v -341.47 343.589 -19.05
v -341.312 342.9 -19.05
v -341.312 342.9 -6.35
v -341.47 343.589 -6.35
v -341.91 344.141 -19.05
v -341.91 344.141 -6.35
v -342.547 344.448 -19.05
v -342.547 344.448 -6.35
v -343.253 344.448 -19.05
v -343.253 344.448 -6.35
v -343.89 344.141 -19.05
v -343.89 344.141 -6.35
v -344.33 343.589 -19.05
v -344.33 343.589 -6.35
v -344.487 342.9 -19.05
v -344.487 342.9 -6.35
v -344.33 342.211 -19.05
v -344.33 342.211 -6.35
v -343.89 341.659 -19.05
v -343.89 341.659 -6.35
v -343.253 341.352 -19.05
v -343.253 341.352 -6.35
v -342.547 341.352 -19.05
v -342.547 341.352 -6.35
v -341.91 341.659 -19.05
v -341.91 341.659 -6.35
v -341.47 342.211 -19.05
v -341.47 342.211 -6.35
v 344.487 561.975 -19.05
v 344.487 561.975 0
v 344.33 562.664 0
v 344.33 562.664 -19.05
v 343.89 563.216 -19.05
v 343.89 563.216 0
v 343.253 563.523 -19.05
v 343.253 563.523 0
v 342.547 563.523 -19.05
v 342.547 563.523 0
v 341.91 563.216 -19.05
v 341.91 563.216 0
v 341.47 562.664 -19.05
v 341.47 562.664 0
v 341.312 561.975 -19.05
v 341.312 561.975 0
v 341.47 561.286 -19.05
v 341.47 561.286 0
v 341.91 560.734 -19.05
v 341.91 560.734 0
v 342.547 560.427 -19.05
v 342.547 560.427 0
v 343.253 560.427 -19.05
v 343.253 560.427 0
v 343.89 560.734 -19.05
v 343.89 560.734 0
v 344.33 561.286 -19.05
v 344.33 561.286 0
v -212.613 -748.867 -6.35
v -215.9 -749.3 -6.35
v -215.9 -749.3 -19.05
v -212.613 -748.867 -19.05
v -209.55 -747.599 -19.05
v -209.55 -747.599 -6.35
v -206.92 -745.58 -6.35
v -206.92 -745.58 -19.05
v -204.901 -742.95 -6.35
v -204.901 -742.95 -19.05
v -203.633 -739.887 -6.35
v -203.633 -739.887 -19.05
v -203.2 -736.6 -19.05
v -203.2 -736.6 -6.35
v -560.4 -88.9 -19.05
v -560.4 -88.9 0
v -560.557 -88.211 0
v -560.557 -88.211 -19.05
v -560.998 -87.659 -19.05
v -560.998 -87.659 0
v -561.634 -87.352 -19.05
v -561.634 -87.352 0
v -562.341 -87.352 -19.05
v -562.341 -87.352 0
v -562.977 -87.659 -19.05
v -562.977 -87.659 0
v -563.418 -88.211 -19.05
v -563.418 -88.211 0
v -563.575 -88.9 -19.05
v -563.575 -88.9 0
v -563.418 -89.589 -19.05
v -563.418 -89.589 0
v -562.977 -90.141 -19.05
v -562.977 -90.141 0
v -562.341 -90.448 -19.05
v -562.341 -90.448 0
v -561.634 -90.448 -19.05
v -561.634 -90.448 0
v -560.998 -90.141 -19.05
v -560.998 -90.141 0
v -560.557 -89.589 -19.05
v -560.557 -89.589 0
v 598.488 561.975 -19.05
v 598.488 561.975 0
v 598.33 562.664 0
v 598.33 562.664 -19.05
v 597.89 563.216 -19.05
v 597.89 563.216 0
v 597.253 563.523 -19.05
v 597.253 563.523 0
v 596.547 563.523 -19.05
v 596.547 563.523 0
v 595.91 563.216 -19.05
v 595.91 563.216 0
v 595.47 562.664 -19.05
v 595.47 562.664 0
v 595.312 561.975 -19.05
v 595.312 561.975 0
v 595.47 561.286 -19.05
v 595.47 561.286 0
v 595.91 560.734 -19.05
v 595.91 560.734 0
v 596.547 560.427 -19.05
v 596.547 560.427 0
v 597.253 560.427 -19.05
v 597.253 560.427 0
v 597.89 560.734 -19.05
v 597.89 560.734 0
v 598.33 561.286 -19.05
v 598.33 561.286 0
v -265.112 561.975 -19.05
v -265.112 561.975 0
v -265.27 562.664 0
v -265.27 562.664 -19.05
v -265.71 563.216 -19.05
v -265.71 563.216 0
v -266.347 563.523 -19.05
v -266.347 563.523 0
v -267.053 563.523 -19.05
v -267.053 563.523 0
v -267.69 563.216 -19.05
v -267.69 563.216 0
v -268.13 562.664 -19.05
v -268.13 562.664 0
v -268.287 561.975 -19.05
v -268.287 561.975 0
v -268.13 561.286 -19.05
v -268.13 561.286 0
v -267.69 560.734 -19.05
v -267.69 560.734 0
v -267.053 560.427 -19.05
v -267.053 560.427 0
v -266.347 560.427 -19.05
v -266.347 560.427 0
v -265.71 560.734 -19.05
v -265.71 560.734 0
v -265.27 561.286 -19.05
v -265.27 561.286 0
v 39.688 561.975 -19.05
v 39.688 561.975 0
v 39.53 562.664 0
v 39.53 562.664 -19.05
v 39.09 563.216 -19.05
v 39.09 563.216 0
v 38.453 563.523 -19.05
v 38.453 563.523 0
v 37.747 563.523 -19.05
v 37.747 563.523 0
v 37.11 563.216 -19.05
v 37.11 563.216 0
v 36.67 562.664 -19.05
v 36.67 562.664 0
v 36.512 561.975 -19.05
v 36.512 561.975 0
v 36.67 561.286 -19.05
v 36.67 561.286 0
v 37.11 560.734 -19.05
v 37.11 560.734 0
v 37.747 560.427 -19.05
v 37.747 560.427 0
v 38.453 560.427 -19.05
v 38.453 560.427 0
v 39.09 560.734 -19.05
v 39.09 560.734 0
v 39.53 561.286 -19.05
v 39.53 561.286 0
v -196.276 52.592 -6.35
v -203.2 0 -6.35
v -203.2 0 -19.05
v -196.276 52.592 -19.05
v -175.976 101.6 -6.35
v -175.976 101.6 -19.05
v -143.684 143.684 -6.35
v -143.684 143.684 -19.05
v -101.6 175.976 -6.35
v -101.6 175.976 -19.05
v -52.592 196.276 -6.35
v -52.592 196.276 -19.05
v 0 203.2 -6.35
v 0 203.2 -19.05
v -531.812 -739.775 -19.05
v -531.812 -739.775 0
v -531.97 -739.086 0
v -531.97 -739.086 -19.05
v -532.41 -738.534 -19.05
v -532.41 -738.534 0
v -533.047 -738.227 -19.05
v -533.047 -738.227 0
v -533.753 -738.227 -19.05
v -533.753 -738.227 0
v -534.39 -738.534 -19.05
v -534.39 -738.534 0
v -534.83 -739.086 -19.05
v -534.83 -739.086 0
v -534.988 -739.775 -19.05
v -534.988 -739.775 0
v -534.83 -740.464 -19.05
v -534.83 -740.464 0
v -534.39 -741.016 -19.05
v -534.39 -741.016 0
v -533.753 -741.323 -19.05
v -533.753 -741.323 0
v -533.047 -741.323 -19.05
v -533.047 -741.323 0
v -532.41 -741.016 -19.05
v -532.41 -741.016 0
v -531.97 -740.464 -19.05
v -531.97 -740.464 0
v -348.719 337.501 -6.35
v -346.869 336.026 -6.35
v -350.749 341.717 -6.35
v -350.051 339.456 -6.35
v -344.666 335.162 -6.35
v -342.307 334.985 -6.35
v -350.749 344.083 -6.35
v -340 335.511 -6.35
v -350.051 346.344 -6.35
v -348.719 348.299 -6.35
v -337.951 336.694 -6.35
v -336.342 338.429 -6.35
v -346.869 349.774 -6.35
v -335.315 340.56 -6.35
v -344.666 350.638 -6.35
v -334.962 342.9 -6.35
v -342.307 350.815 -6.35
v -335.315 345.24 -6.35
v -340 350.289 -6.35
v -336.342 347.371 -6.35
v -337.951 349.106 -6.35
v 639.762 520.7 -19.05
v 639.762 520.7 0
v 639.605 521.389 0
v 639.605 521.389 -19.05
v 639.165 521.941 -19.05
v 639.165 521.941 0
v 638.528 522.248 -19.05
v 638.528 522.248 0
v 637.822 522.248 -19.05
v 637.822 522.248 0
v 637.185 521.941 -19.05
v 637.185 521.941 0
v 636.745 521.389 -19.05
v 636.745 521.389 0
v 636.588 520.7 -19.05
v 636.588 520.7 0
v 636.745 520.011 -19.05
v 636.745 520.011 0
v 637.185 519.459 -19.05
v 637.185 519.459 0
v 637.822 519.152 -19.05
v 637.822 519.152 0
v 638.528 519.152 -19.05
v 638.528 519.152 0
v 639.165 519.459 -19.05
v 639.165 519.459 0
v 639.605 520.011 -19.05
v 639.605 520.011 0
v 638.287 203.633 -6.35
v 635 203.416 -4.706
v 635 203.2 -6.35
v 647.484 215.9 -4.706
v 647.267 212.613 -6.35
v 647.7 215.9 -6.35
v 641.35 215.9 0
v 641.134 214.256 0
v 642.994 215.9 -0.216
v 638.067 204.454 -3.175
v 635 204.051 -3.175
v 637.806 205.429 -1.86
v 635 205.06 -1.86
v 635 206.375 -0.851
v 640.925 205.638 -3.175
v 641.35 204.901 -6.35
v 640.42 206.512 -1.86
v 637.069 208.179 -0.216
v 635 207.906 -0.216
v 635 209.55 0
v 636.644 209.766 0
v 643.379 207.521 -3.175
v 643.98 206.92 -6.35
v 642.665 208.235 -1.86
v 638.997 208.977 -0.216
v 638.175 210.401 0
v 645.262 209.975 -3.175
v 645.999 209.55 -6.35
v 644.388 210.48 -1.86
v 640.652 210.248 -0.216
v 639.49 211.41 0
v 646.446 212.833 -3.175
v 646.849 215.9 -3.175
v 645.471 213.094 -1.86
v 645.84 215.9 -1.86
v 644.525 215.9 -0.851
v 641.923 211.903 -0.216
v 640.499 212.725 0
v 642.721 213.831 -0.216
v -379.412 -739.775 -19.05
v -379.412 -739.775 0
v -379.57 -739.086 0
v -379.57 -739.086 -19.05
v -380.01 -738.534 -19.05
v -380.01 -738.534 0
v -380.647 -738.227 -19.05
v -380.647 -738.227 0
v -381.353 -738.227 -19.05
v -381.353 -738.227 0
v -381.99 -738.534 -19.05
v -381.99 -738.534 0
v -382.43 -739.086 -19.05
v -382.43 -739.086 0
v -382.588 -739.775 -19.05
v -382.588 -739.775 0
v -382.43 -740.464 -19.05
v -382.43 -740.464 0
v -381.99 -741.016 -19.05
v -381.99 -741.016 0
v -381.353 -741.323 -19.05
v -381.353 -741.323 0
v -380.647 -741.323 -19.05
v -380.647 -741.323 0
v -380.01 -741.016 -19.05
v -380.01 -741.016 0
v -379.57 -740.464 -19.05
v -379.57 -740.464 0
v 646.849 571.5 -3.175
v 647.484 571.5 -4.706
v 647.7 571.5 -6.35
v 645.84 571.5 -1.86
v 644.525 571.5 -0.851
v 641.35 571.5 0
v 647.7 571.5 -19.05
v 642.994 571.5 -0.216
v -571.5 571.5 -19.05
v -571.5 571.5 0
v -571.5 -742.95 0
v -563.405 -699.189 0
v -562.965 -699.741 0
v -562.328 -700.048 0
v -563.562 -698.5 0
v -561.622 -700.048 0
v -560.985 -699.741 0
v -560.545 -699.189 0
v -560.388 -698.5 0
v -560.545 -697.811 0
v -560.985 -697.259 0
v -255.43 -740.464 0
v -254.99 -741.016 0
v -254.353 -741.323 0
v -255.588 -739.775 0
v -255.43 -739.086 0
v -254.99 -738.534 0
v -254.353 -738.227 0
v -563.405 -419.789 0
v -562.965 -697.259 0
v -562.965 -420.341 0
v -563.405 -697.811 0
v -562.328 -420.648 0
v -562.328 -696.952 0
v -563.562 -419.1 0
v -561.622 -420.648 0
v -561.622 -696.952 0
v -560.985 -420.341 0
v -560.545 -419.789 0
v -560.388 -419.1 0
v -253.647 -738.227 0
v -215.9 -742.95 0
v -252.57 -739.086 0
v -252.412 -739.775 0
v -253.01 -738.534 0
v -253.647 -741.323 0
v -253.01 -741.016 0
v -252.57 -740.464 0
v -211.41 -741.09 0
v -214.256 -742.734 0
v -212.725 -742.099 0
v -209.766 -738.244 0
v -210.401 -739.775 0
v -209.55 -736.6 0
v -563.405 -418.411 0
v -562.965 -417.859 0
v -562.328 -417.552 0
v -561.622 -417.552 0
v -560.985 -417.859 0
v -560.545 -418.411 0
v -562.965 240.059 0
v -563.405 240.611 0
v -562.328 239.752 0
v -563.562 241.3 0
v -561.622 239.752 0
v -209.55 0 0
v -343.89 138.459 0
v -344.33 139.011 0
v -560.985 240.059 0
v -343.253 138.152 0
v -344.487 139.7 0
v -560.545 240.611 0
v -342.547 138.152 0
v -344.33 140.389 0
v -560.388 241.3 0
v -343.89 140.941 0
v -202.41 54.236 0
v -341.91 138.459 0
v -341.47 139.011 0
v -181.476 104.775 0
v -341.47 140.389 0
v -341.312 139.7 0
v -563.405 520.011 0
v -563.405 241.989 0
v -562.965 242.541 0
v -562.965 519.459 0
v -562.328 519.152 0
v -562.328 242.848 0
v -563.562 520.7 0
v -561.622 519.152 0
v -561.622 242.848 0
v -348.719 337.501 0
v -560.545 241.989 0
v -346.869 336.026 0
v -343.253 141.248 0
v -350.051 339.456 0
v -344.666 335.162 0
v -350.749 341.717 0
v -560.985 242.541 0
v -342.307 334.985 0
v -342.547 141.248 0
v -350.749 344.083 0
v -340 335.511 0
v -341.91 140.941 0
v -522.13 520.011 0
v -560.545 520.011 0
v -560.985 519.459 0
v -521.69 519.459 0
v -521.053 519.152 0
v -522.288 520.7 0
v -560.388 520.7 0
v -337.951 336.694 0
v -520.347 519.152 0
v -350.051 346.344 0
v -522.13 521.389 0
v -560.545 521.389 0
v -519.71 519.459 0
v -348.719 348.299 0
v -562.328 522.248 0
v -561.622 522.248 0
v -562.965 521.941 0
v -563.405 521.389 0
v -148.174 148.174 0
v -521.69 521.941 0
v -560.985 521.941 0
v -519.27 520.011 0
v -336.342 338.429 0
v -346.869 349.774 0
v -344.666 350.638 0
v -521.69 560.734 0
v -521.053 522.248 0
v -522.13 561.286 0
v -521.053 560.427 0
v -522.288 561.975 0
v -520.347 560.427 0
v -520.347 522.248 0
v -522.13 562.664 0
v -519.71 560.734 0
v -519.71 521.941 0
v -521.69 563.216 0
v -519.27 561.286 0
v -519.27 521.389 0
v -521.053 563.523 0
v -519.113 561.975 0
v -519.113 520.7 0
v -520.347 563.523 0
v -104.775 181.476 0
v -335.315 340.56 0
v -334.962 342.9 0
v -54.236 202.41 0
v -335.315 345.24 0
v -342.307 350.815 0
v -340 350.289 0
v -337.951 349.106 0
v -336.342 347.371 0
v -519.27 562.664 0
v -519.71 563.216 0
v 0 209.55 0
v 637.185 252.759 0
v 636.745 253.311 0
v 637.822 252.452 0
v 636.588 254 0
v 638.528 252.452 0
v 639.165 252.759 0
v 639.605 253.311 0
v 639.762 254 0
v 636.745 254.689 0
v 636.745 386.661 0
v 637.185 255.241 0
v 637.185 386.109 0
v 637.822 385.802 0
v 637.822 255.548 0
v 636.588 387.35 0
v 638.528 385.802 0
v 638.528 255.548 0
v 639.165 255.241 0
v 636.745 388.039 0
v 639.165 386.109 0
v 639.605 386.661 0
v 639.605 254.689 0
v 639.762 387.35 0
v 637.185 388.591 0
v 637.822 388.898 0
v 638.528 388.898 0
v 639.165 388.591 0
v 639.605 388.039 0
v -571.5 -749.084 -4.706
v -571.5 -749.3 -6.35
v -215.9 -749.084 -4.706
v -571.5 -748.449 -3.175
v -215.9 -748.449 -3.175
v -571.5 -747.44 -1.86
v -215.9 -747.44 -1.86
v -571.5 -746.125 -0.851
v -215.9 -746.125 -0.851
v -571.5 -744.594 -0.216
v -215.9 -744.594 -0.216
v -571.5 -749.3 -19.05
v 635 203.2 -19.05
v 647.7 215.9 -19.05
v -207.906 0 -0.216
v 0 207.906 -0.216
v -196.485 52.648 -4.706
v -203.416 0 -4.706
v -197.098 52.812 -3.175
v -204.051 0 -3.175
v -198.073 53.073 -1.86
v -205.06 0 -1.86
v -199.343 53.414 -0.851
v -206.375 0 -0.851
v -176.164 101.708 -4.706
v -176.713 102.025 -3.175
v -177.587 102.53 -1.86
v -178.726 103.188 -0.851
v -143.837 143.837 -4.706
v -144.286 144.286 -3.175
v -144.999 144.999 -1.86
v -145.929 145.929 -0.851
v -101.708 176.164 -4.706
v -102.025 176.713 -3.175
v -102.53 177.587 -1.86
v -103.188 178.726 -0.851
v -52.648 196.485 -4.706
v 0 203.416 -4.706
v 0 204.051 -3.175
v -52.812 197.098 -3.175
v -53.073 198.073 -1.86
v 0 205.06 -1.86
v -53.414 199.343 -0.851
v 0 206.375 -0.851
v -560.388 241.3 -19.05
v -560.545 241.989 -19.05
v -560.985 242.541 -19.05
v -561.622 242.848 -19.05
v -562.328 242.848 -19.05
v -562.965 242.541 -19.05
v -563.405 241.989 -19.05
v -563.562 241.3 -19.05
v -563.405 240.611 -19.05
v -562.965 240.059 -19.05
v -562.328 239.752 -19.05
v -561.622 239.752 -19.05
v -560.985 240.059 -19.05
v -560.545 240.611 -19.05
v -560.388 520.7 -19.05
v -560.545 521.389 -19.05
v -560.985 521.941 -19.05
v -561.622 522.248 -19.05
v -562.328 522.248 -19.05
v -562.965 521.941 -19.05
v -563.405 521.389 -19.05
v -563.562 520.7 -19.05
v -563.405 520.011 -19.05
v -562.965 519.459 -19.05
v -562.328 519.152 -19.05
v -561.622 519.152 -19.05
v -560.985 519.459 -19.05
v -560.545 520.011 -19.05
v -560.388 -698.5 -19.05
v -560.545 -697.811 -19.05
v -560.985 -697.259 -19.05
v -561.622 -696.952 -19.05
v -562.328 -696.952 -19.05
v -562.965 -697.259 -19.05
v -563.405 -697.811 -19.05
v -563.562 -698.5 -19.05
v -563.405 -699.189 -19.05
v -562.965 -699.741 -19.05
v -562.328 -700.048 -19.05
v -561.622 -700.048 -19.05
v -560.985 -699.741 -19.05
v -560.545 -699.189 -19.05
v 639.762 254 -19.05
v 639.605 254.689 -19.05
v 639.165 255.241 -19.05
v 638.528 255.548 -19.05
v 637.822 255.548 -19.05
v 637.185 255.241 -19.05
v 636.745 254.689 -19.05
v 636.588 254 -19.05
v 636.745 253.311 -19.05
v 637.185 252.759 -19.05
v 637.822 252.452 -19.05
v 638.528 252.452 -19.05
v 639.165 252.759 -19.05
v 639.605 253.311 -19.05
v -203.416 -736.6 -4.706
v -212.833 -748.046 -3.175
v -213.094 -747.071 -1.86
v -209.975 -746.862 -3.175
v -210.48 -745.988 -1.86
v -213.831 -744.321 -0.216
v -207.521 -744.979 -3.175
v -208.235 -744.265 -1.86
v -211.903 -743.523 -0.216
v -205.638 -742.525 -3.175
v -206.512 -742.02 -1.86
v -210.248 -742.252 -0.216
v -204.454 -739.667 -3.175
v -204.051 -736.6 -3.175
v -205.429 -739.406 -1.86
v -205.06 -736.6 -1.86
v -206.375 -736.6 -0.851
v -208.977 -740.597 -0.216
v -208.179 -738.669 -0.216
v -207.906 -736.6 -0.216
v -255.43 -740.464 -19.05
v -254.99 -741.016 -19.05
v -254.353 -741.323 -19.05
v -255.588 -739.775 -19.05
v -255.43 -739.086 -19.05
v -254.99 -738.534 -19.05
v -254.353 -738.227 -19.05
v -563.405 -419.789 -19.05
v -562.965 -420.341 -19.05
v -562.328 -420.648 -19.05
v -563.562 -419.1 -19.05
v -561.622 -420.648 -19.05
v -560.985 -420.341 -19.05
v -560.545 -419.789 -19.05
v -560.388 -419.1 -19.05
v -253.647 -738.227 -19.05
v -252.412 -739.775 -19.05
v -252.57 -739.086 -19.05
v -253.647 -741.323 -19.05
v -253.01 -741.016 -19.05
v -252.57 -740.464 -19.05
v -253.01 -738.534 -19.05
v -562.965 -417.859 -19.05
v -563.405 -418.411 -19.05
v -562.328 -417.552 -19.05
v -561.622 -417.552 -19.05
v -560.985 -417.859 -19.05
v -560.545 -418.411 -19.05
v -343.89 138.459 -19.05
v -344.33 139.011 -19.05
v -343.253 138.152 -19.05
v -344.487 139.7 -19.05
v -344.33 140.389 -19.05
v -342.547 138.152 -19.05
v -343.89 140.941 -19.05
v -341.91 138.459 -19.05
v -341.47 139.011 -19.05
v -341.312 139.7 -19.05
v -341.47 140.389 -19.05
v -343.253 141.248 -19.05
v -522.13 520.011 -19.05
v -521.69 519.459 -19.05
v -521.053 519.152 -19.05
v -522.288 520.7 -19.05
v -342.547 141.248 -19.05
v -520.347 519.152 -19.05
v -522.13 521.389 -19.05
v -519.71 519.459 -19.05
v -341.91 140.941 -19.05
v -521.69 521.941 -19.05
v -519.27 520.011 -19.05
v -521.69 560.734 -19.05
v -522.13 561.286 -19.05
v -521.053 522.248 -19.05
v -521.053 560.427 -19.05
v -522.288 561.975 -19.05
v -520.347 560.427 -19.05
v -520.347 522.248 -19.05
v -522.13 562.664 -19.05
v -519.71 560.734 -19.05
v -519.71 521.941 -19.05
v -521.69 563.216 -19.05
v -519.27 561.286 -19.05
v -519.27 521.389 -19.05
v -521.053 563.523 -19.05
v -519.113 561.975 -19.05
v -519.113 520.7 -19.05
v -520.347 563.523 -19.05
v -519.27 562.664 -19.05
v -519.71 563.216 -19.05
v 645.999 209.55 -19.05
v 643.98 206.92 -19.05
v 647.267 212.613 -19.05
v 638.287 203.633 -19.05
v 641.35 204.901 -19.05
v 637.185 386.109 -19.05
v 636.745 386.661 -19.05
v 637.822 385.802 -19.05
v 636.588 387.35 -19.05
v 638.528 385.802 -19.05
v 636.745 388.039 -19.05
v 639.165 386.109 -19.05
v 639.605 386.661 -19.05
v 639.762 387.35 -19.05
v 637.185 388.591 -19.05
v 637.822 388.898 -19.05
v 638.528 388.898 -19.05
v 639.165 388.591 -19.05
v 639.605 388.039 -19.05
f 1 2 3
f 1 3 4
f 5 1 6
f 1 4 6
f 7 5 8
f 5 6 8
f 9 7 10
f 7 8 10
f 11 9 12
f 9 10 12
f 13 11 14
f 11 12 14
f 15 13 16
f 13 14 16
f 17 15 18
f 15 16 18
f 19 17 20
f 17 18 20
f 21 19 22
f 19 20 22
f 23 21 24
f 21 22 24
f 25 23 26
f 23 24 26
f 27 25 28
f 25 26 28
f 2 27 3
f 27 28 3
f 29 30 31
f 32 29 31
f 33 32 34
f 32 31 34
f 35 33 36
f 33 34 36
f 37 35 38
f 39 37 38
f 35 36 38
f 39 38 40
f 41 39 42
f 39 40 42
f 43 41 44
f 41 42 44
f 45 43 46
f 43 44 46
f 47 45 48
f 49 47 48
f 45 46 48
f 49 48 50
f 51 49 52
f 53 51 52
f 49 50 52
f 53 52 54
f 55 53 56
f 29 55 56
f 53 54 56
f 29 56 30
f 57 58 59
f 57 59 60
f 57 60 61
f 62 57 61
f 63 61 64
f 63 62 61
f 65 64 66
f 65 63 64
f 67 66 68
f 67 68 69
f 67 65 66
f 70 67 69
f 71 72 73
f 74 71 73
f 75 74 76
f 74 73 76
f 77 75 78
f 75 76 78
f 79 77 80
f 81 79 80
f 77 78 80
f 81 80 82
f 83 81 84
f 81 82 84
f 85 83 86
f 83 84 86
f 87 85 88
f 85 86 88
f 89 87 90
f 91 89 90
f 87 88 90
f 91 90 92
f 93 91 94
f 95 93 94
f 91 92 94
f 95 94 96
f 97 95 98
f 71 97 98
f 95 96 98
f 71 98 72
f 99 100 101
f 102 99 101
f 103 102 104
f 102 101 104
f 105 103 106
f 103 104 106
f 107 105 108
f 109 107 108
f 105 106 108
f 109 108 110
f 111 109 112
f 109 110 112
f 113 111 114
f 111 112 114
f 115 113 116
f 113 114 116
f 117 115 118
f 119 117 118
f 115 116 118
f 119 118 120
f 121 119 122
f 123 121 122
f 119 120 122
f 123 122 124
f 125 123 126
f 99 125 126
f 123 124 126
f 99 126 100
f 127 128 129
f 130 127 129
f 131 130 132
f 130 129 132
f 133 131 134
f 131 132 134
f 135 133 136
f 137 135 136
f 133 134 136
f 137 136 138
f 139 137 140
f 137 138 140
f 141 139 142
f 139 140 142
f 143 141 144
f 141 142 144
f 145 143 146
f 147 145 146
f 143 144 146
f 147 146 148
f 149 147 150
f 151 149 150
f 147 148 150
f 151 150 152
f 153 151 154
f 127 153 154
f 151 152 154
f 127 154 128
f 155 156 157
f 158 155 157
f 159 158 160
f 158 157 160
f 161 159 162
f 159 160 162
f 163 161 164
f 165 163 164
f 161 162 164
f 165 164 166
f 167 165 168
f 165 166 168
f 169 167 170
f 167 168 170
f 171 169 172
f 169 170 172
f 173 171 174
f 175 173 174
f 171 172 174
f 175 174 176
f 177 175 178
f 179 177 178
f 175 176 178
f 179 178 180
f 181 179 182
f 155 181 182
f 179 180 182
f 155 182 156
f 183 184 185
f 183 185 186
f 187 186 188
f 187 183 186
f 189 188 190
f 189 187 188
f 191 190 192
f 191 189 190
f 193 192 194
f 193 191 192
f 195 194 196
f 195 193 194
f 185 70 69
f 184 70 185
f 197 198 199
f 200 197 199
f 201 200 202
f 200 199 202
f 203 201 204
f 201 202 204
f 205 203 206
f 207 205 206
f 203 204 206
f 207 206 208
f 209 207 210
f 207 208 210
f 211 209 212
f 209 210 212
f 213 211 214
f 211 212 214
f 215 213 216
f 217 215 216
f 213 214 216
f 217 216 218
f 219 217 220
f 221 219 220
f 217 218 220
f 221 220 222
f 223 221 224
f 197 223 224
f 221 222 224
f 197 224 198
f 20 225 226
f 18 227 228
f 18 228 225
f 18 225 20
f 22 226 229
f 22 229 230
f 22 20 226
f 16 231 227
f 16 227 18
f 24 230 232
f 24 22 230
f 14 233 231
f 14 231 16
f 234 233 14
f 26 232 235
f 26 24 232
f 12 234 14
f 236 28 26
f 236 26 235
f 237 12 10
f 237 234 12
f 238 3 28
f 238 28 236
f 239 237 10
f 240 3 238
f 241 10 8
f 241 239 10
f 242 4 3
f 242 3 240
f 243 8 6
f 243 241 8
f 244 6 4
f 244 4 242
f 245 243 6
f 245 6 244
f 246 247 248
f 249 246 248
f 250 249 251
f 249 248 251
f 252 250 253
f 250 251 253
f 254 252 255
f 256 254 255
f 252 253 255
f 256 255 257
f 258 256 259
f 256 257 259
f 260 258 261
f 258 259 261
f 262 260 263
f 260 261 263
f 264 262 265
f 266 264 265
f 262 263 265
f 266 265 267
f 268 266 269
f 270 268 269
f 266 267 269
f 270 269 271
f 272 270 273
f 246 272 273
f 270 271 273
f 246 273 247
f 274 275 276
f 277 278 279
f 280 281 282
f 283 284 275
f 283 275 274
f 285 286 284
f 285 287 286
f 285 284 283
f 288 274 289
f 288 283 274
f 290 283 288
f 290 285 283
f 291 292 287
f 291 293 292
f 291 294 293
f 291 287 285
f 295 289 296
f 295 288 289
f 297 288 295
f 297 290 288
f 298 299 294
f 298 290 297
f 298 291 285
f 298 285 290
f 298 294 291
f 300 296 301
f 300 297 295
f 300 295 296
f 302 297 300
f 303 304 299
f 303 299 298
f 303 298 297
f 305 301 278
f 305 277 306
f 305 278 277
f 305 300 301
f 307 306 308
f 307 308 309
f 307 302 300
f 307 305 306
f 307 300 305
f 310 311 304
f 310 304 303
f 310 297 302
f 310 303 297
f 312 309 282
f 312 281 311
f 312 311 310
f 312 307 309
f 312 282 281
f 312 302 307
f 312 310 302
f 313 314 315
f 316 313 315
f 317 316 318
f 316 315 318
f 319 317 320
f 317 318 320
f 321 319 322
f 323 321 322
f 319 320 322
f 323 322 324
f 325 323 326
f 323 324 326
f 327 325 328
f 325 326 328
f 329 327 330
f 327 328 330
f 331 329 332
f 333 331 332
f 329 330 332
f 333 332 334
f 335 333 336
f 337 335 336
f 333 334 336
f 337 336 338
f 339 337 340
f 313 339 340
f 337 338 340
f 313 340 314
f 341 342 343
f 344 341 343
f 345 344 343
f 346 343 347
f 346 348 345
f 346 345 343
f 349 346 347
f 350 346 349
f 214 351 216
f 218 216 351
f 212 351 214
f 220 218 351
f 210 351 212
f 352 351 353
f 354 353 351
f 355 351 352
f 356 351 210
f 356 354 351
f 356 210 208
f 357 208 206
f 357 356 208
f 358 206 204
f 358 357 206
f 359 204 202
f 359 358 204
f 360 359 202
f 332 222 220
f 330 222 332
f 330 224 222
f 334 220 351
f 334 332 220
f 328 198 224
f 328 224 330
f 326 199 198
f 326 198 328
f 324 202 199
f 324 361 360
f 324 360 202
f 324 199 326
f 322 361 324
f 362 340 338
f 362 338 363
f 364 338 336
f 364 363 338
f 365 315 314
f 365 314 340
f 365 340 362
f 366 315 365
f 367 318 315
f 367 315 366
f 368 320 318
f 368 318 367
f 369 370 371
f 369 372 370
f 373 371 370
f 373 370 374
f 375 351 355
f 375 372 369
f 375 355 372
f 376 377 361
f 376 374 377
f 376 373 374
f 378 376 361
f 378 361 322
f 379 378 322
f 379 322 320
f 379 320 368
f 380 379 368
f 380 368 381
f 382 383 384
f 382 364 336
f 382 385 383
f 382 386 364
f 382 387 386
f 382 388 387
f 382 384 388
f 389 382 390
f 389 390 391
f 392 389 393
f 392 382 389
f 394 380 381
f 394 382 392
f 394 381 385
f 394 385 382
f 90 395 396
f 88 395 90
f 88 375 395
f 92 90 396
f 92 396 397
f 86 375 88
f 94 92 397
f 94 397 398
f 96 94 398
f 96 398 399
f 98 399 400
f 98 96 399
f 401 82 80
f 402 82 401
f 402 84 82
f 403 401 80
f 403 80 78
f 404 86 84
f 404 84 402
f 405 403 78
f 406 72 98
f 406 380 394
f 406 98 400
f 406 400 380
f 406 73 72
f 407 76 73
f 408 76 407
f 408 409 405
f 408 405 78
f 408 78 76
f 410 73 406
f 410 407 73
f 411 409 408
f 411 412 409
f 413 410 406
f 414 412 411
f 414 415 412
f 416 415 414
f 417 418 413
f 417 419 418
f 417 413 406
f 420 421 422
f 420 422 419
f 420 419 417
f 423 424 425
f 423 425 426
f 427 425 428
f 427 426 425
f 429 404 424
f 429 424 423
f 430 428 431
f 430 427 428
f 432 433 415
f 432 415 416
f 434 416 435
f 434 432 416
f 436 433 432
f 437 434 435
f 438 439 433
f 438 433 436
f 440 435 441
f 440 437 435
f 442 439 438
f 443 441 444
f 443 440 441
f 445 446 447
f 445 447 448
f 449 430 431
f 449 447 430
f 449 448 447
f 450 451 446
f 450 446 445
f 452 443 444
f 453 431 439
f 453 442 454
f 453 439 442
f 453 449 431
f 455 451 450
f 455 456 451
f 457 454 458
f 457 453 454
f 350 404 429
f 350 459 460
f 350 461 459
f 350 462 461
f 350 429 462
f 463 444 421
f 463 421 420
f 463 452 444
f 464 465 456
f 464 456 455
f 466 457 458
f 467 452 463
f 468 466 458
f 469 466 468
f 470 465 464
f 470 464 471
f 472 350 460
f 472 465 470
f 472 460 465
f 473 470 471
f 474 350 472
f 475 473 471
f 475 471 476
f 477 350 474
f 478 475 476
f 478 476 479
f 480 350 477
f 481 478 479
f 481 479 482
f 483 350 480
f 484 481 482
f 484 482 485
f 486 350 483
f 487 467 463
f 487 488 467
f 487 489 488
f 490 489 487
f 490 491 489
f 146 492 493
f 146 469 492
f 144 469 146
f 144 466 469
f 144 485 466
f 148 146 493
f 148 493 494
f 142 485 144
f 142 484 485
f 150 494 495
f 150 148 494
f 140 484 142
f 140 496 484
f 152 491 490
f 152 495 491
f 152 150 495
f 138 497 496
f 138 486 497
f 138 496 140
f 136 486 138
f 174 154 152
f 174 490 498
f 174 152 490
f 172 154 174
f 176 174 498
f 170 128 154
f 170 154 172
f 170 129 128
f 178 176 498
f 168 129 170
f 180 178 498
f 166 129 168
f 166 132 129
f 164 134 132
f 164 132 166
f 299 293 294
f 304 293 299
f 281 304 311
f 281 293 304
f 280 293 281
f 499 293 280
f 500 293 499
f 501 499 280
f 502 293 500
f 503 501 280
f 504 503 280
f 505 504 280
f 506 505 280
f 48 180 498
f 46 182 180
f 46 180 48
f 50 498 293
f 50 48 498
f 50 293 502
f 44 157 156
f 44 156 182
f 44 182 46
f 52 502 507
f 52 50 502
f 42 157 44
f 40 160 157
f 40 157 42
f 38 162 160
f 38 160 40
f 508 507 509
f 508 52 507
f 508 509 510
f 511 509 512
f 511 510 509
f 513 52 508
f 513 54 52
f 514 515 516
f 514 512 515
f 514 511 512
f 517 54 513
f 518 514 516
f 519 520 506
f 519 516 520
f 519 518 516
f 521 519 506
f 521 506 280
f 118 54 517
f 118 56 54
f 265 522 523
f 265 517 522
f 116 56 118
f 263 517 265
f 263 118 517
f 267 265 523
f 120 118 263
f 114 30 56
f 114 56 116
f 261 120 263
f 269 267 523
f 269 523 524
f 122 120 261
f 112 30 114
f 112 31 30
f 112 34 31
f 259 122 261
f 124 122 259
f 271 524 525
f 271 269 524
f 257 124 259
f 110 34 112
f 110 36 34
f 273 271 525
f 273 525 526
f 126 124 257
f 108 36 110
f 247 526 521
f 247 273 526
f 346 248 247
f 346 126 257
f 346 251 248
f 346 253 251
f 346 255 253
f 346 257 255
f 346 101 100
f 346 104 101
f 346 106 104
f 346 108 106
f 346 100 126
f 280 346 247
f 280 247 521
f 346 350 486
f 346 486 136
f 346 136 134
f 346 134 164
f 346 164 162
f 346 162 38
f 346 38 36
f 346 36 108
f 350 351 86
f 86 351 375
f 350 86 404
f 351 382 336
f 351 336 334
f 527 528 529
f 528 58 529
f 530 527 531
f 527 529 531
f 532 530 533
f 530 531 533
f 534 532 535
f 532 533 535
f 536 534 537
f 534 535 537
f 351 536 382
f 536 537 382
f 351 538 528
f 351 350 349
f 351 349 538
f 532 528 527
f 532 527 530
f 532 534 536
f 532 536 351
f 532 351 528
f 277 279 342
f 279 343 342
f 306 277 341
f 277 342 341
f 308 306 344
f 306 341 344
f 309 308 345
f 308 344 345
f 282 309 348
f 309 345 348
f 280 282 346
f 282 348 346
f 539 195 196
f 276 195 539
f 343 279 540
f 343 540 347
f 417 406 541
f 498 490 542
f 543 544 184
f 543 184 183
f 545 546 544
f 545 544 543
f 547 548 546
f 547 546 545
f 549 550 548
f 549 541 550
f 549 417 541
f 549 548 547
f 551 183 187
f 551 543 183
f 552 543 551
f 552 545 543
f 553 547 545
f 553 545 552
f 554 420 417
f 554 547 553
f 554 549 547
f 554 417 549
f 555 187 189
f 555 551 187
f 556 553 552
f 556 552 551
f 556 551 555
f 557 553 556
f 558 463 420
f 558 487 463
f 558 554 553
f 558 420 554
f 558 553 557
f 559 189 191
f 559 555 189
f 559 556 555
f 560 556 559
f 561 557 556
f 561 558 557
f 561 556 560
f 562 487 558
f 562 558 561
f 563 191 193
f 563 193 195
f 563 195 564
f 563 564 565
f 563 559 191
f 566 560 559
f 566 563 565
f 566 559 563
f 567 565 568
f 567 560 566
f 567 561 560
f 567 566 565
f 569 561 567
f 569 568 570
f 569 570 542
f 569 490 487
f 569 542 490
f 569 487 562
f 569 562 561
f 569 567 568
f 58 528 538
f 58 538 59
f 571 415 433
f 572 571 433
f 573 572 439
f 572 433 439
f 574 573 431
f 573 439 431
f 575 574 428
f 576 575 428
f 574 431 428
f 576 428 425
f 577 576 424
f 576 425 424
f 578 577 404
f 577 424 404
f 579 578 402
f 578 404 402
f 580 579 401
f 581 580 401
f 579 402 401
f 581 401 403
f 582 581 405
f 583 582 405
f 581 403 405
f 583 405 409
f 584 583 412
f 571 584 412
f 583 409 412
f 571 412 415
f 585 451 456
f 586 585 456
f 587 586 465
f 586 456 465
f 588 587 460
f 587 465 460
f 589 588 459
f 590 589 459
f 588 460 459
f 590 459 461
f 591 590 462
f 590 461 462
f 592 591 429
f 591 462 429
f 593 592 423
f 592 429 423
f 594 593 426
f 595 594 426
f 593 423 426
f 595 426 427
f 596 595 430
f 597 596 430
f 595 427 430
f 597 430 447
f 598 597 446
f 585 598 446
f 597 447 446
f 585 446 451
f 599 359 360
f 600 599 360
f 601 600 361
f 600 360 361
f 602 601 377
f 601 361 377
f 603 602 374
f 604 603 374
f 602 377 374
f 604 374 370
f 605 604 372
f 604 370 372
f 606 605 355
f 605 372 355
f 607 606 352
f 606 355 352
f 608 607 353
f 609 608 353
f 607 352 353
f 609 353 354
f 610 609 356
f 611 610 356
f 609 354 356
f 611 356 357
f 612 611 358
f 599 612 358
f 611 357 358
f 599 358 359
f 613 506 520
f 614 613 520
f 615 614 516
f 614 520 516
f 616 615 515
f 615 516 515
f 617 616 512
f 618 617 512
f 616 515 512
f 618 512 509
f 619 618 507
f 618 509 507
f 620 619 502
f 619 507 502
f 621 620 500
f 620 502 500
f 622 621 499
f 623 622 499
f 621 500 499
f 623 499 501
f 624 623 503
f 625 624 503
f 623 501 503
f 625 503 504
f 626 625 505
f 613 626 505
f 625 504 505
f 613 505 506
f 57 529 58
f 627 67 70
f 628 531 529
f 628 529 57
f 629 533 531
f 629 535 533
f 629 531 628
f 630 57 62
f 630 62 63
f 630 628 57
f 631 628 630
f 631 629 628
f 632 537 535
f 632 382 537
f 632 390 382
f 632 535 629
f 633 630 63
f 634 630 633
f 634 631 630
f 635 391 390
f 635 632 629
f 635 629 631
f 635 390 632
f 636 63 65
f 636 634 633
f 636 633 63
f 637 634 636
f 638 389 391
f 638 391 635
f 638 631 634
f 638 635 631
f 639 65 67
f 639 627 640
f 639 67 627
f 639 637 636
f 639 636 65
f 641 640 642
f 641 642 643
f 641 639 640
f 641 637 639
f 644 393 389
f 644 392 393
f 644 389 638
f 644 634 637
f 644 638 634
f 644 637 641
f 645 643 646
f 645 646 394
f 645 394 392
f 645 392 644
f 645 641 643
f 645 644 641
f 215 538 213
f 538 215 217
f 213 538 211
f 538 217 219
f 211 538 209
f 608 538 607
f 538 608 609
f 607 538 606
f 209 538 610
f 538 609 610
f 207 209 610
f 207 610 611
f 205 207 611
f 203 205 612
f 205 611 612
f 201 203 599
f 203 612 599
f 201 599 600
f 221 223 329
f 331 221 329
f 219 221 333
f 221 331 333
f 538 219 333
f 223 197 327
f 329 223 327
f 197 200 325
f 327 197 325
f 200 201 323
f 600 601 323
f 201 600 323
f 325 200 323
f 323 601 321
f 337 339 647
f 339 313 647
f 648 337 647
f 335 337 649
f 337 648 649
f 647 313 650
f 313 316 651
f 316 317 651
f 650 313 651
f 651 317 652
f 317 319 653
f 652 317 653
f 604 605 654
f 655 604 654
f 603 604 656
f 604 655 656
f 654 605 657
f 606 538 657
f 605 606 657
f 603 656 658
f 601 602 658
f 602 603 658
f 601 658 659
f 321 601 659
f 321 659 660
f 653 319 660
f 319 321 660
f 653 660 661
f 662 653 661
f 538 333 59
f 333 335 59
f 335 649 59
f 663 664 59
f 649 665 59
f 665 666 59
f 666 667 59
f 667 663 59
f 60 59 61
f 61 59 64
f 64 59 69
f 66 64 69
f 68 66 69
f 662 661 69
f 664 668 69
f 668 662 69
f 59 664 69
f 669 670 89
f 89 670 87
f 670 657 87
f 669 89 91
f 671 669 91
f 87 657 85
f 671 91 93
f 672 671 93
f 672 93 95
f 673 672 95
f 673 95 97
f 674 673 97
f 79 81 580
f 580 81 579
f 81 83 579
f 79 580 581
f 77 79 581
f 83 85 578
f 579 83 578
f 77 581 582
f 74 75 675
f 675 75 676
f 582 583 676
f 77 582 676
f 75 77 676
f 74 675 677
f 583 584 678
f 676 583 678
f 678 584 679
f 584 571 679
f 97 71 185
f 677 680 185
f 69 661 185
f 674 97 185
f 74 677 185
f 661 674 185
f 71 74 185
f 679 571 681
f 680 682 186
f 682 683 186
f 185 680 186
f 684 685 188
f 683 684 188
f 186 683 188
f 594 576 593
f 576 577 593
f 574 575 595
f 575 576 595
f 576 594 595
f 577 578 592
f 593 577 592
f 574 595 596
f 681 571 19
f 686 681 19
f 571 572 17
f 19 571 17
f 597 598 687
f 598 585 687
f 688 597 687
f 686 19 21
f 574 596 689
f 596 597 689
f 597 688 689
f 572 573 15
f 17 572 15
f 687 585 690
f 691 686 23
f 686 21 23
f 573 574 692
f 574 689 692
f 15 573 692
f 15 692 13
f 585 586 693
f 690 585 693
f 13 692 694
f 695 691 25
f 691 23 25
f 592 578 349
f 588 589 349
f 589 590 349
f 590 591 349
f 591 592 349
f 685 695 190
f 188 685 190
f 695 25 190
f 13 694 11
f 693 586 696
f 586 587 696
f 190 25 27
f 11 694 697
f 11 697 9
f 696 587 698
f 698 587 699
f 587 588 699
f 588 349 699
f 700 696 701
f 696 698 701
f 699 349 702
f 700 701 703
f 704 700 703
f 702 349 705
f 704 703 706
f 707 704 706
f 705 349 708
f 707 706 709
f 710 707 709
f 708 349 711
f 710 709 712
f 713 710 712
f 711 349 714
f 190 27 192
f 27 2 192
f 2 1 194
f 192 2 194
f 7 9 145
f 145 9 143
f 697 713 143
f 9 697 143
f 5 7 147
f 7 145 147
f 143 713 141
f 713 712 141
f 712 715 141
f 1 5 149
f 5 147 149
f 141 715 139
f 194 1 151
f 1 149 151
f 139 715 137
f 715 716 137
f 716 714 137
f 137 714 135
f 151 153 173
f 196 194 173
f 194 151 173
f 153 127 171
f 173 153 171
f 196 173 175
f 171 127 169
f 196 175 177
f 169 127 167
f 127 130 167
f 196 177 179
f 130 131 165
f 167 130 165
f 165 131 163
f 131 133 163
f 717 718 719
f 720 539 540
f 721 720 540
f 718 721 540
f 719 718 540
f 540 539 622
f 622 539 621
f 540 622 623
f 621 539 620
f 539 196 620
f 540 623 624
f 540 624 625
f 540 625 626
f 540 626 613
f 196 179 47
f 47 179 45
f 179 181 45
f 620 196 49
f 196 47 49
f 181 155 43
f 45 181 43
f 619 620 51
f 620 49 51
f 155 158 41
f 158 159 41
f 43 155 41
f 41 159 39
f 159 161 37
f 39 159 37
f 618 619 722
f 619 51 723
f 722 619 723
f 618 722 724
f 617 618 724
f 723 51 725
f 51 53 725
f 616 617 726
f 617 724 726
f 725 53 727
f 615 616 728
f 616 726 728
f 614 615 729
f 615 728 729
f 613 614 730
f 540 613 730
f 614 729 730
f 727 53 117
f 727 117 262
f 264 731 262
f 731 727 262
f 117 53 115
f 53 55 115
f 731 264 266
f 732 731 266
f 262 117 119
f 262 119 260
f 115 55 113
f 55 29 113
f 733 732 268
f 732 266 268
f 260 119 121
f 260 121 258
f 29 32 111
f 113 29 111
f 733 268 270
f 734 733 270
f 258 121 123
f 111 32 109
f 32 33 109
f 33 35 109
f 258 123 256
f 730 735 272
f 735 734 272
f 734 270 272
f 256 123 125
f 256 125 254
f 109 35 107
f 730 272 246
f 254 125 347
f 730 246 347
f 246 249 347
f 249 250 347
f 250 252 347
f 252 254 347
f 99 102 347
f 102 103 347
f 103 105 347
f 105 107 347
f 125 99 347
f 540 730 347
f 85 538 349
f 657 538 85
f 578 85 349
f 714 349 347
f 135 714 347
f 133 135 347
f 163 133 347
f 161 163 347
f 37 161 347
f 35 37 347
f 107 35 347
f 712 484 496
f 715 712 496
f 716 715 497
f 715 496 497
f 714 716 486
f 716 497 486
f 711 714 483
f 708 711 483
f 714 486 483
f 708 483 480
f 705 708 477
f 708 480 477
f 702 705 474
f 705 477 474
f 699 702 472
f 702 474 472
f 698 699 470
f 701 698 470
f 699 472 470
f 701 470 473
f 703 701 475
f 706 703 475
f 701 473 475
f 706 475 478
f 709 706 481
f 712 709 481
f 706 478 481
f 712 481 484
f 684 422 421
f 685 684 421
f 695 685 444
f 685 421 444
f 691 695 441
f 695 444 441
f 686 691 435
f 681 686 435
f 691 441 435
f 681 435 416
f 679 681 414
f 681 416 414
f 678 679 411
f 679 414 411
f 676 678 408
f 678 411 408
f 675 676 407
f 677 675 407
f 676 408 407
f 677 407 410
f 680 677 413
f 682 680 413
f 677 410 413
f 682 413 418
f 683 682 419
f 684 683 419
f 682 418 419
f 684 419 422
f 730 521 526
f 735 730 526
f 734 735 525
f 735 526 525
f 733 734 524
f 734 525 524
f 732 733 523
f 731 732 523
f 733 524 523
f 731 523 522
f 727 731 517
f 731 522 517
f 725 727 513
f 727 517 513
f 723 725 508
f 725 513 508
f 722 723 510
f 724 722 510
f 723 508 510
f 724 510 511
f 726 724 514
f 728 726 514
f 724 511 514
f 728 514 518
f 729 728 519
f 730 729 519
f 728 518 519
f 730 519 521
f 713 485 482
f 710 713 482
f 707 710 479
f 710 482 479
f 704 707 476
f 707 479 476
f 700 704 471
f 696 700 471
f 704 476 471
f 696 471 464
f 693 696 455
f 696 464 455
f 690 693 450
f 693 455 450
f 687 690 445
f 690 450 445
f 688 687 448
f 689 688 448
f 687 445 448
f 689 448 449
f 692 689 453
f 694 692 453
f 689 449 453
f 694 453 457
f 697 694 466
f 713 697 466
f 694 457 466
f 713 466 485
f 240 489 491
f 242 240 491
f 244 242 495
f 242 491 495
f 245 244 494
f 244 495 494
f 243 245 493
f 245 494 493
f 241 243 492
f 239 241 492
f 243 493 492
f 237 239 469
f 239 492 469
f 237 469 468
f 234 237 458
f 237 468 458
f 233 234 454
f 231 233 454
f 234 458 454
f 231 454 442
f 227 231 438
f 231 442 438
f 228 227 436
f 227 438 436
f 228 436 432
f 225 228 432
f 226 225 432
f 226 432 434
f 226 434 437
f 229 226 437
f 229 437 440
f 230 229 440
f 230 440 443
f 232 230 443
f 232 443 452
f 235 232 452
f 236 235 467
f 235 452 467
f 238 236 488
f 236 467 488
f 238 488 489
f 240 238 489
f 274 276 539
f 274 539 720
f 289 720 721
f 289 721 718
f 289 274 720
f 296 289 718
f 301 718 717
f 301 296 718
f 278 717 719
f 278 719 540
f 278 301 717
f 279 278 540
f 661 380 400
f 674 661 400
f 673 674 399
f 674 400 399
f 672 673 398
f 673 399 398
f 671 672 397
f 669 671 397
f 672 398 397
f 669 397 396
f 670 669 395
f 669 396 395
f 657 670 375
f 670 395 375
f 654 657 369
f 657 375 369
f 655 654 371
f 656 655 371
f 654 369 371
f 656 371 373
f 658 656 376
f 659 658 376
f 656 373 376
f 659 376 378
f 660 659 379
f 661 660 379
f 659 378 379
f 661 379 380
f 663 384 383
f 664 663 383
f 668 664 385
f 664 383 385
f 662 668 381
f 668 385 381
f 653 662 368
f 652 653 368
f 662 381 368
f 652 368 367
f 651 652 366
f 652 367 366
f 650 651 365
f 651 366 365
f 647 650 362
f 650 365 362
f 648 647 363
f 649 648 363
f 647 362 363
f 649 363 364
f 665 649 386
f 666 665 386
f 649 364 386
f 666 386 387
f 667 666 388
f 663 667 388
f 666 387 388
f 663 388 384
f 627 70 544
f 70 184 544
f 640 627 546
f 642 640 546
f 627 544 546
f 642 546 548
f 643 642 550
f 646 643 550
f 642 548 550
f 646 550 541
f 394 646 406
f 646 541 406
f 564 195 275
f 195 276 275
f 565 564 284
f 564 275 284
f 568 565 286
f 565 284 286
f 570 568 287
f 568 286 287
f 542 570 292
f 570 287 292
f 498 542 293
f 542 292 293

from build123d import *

# Parameters (mm, degrees)
F0_R     = 1.5875
F1_DEPTH = 19.05
F2_R     = 6.35
F3_R     = 7.9375
F4_DEPTH = 6.35


with BuildPart() as f1:
    # F0 (on Top) → F1 (new body)
    with BuildSketch(Plane.XY):
        with BuildLine():
            Line((-571.5, 571.5), (-571.5, -749.3))
            Line((-571.5, -749.3), (-215.9, -749.3))
            ThreePointArc((-215.9, -749.3), (-206.919744, -745.580256), (-203.2, -736.6))
            Line((-203.2, -736.6), (-203.2, 0))
            ThreePointArc((-203.2, 0), (-143.684098, 143.684098), (0, 203.2))
            Line((0, 203.2), (635, 203.2))
            ThreePointArc((635, 203.2), (643.980256, 206.919744), (647.7, 215.9))
            Line((647.7, 215.9), (647.7, 571.5))
            Line((647.7, 571.5), (-571.5, 571.5))
        make_face()
        with Locations((-533.4, -739.775)):
            Circle(F0_R, mode=Mode.SUBTRACT)
        with Locations((-561.975, -698.5)):
            Circle(F0_R, mode=Mode.SUBTRACT)
        with Locations((-381, -739.775)):
            Circle(F0_R, mode=Mode.SUBTRACT)
        with Locations((-561.975, -419.1)):
            Circle(F0_R, mode=Mode.SUBTRACT)
        with Locations((-254, -739.775)):
            Circle(F0_R, mode=Mode.SUBTRACT)
        with Locations((-561.9877, -88.9)):
            Circle(F0_R, mode=Mode.SUBTRACT)
        with Locations((-561.975, 241.3)):
            Circle(F0_R, mode=Mode.SUBTRACT)
        with Locations((-342.9, 139.7)):
            Circle(F0_R, mode=Mode.SUBTRACT)
        with Locations((-342.9, 342.9)):
            Circle(F0_R, mode=Mode.SUBTRACT)
        with Locations((-561.975, 520.7)):
            Circle(F0_R, mode=Mode.SUBTRACT)
        with Locations((-520.7, 520.7)):
            Circle(F0_R, mode=Mode.SUBTRACT)
        with Locations((-520.7, 561.975)):
            Circle(F0_R, mode=Mode.SUBTRACT)
        with Locations((-266.7, 561.975)):
            Circle(F0_R, mode=Mode.SUBTRACT)
        with Locations((38.1, 561.975)):
            Circle(F0_R, mode=Mode.SUBTRACT)
        with Locations((638.175, 254)):
            Circle(F0_R, mode=Mode.SUBTRACT)
        with Locations((638.175, 387.35)):
            Circle(F0_R, mode=Mode.SUBTRACT)
        with Locations((342.9, 561.975)):
            Circle(F0_R, mode=Mode.SUBTRACT)
        with Locations((638.175, 520.7)):
            Circle(F0_R, mode=Mode.SUBTRACT)
        with Locations((596.9, 561.975)):
            Circle(F0_R, mode=Mode.SUBTRACT)
    extrude(amount=-F1_DEPTH)

    # F2
    f2_edges = [f1.edges().sort_by_distance(p)[0] for p in [
        (-393.7, -749.3, 0),
    ]]
    fillet(f2_edges, radius=F2_R)

    # F3 (on face) → F4 (cut)
    with BuildSketch(Plane.XY):
        with Locations((-342.9, 342.9)):
            Circle(F3_R)
    extrude(amount=-F4_DEPTH, mode=Mode.SUBTRACT)


solid = f1.part
